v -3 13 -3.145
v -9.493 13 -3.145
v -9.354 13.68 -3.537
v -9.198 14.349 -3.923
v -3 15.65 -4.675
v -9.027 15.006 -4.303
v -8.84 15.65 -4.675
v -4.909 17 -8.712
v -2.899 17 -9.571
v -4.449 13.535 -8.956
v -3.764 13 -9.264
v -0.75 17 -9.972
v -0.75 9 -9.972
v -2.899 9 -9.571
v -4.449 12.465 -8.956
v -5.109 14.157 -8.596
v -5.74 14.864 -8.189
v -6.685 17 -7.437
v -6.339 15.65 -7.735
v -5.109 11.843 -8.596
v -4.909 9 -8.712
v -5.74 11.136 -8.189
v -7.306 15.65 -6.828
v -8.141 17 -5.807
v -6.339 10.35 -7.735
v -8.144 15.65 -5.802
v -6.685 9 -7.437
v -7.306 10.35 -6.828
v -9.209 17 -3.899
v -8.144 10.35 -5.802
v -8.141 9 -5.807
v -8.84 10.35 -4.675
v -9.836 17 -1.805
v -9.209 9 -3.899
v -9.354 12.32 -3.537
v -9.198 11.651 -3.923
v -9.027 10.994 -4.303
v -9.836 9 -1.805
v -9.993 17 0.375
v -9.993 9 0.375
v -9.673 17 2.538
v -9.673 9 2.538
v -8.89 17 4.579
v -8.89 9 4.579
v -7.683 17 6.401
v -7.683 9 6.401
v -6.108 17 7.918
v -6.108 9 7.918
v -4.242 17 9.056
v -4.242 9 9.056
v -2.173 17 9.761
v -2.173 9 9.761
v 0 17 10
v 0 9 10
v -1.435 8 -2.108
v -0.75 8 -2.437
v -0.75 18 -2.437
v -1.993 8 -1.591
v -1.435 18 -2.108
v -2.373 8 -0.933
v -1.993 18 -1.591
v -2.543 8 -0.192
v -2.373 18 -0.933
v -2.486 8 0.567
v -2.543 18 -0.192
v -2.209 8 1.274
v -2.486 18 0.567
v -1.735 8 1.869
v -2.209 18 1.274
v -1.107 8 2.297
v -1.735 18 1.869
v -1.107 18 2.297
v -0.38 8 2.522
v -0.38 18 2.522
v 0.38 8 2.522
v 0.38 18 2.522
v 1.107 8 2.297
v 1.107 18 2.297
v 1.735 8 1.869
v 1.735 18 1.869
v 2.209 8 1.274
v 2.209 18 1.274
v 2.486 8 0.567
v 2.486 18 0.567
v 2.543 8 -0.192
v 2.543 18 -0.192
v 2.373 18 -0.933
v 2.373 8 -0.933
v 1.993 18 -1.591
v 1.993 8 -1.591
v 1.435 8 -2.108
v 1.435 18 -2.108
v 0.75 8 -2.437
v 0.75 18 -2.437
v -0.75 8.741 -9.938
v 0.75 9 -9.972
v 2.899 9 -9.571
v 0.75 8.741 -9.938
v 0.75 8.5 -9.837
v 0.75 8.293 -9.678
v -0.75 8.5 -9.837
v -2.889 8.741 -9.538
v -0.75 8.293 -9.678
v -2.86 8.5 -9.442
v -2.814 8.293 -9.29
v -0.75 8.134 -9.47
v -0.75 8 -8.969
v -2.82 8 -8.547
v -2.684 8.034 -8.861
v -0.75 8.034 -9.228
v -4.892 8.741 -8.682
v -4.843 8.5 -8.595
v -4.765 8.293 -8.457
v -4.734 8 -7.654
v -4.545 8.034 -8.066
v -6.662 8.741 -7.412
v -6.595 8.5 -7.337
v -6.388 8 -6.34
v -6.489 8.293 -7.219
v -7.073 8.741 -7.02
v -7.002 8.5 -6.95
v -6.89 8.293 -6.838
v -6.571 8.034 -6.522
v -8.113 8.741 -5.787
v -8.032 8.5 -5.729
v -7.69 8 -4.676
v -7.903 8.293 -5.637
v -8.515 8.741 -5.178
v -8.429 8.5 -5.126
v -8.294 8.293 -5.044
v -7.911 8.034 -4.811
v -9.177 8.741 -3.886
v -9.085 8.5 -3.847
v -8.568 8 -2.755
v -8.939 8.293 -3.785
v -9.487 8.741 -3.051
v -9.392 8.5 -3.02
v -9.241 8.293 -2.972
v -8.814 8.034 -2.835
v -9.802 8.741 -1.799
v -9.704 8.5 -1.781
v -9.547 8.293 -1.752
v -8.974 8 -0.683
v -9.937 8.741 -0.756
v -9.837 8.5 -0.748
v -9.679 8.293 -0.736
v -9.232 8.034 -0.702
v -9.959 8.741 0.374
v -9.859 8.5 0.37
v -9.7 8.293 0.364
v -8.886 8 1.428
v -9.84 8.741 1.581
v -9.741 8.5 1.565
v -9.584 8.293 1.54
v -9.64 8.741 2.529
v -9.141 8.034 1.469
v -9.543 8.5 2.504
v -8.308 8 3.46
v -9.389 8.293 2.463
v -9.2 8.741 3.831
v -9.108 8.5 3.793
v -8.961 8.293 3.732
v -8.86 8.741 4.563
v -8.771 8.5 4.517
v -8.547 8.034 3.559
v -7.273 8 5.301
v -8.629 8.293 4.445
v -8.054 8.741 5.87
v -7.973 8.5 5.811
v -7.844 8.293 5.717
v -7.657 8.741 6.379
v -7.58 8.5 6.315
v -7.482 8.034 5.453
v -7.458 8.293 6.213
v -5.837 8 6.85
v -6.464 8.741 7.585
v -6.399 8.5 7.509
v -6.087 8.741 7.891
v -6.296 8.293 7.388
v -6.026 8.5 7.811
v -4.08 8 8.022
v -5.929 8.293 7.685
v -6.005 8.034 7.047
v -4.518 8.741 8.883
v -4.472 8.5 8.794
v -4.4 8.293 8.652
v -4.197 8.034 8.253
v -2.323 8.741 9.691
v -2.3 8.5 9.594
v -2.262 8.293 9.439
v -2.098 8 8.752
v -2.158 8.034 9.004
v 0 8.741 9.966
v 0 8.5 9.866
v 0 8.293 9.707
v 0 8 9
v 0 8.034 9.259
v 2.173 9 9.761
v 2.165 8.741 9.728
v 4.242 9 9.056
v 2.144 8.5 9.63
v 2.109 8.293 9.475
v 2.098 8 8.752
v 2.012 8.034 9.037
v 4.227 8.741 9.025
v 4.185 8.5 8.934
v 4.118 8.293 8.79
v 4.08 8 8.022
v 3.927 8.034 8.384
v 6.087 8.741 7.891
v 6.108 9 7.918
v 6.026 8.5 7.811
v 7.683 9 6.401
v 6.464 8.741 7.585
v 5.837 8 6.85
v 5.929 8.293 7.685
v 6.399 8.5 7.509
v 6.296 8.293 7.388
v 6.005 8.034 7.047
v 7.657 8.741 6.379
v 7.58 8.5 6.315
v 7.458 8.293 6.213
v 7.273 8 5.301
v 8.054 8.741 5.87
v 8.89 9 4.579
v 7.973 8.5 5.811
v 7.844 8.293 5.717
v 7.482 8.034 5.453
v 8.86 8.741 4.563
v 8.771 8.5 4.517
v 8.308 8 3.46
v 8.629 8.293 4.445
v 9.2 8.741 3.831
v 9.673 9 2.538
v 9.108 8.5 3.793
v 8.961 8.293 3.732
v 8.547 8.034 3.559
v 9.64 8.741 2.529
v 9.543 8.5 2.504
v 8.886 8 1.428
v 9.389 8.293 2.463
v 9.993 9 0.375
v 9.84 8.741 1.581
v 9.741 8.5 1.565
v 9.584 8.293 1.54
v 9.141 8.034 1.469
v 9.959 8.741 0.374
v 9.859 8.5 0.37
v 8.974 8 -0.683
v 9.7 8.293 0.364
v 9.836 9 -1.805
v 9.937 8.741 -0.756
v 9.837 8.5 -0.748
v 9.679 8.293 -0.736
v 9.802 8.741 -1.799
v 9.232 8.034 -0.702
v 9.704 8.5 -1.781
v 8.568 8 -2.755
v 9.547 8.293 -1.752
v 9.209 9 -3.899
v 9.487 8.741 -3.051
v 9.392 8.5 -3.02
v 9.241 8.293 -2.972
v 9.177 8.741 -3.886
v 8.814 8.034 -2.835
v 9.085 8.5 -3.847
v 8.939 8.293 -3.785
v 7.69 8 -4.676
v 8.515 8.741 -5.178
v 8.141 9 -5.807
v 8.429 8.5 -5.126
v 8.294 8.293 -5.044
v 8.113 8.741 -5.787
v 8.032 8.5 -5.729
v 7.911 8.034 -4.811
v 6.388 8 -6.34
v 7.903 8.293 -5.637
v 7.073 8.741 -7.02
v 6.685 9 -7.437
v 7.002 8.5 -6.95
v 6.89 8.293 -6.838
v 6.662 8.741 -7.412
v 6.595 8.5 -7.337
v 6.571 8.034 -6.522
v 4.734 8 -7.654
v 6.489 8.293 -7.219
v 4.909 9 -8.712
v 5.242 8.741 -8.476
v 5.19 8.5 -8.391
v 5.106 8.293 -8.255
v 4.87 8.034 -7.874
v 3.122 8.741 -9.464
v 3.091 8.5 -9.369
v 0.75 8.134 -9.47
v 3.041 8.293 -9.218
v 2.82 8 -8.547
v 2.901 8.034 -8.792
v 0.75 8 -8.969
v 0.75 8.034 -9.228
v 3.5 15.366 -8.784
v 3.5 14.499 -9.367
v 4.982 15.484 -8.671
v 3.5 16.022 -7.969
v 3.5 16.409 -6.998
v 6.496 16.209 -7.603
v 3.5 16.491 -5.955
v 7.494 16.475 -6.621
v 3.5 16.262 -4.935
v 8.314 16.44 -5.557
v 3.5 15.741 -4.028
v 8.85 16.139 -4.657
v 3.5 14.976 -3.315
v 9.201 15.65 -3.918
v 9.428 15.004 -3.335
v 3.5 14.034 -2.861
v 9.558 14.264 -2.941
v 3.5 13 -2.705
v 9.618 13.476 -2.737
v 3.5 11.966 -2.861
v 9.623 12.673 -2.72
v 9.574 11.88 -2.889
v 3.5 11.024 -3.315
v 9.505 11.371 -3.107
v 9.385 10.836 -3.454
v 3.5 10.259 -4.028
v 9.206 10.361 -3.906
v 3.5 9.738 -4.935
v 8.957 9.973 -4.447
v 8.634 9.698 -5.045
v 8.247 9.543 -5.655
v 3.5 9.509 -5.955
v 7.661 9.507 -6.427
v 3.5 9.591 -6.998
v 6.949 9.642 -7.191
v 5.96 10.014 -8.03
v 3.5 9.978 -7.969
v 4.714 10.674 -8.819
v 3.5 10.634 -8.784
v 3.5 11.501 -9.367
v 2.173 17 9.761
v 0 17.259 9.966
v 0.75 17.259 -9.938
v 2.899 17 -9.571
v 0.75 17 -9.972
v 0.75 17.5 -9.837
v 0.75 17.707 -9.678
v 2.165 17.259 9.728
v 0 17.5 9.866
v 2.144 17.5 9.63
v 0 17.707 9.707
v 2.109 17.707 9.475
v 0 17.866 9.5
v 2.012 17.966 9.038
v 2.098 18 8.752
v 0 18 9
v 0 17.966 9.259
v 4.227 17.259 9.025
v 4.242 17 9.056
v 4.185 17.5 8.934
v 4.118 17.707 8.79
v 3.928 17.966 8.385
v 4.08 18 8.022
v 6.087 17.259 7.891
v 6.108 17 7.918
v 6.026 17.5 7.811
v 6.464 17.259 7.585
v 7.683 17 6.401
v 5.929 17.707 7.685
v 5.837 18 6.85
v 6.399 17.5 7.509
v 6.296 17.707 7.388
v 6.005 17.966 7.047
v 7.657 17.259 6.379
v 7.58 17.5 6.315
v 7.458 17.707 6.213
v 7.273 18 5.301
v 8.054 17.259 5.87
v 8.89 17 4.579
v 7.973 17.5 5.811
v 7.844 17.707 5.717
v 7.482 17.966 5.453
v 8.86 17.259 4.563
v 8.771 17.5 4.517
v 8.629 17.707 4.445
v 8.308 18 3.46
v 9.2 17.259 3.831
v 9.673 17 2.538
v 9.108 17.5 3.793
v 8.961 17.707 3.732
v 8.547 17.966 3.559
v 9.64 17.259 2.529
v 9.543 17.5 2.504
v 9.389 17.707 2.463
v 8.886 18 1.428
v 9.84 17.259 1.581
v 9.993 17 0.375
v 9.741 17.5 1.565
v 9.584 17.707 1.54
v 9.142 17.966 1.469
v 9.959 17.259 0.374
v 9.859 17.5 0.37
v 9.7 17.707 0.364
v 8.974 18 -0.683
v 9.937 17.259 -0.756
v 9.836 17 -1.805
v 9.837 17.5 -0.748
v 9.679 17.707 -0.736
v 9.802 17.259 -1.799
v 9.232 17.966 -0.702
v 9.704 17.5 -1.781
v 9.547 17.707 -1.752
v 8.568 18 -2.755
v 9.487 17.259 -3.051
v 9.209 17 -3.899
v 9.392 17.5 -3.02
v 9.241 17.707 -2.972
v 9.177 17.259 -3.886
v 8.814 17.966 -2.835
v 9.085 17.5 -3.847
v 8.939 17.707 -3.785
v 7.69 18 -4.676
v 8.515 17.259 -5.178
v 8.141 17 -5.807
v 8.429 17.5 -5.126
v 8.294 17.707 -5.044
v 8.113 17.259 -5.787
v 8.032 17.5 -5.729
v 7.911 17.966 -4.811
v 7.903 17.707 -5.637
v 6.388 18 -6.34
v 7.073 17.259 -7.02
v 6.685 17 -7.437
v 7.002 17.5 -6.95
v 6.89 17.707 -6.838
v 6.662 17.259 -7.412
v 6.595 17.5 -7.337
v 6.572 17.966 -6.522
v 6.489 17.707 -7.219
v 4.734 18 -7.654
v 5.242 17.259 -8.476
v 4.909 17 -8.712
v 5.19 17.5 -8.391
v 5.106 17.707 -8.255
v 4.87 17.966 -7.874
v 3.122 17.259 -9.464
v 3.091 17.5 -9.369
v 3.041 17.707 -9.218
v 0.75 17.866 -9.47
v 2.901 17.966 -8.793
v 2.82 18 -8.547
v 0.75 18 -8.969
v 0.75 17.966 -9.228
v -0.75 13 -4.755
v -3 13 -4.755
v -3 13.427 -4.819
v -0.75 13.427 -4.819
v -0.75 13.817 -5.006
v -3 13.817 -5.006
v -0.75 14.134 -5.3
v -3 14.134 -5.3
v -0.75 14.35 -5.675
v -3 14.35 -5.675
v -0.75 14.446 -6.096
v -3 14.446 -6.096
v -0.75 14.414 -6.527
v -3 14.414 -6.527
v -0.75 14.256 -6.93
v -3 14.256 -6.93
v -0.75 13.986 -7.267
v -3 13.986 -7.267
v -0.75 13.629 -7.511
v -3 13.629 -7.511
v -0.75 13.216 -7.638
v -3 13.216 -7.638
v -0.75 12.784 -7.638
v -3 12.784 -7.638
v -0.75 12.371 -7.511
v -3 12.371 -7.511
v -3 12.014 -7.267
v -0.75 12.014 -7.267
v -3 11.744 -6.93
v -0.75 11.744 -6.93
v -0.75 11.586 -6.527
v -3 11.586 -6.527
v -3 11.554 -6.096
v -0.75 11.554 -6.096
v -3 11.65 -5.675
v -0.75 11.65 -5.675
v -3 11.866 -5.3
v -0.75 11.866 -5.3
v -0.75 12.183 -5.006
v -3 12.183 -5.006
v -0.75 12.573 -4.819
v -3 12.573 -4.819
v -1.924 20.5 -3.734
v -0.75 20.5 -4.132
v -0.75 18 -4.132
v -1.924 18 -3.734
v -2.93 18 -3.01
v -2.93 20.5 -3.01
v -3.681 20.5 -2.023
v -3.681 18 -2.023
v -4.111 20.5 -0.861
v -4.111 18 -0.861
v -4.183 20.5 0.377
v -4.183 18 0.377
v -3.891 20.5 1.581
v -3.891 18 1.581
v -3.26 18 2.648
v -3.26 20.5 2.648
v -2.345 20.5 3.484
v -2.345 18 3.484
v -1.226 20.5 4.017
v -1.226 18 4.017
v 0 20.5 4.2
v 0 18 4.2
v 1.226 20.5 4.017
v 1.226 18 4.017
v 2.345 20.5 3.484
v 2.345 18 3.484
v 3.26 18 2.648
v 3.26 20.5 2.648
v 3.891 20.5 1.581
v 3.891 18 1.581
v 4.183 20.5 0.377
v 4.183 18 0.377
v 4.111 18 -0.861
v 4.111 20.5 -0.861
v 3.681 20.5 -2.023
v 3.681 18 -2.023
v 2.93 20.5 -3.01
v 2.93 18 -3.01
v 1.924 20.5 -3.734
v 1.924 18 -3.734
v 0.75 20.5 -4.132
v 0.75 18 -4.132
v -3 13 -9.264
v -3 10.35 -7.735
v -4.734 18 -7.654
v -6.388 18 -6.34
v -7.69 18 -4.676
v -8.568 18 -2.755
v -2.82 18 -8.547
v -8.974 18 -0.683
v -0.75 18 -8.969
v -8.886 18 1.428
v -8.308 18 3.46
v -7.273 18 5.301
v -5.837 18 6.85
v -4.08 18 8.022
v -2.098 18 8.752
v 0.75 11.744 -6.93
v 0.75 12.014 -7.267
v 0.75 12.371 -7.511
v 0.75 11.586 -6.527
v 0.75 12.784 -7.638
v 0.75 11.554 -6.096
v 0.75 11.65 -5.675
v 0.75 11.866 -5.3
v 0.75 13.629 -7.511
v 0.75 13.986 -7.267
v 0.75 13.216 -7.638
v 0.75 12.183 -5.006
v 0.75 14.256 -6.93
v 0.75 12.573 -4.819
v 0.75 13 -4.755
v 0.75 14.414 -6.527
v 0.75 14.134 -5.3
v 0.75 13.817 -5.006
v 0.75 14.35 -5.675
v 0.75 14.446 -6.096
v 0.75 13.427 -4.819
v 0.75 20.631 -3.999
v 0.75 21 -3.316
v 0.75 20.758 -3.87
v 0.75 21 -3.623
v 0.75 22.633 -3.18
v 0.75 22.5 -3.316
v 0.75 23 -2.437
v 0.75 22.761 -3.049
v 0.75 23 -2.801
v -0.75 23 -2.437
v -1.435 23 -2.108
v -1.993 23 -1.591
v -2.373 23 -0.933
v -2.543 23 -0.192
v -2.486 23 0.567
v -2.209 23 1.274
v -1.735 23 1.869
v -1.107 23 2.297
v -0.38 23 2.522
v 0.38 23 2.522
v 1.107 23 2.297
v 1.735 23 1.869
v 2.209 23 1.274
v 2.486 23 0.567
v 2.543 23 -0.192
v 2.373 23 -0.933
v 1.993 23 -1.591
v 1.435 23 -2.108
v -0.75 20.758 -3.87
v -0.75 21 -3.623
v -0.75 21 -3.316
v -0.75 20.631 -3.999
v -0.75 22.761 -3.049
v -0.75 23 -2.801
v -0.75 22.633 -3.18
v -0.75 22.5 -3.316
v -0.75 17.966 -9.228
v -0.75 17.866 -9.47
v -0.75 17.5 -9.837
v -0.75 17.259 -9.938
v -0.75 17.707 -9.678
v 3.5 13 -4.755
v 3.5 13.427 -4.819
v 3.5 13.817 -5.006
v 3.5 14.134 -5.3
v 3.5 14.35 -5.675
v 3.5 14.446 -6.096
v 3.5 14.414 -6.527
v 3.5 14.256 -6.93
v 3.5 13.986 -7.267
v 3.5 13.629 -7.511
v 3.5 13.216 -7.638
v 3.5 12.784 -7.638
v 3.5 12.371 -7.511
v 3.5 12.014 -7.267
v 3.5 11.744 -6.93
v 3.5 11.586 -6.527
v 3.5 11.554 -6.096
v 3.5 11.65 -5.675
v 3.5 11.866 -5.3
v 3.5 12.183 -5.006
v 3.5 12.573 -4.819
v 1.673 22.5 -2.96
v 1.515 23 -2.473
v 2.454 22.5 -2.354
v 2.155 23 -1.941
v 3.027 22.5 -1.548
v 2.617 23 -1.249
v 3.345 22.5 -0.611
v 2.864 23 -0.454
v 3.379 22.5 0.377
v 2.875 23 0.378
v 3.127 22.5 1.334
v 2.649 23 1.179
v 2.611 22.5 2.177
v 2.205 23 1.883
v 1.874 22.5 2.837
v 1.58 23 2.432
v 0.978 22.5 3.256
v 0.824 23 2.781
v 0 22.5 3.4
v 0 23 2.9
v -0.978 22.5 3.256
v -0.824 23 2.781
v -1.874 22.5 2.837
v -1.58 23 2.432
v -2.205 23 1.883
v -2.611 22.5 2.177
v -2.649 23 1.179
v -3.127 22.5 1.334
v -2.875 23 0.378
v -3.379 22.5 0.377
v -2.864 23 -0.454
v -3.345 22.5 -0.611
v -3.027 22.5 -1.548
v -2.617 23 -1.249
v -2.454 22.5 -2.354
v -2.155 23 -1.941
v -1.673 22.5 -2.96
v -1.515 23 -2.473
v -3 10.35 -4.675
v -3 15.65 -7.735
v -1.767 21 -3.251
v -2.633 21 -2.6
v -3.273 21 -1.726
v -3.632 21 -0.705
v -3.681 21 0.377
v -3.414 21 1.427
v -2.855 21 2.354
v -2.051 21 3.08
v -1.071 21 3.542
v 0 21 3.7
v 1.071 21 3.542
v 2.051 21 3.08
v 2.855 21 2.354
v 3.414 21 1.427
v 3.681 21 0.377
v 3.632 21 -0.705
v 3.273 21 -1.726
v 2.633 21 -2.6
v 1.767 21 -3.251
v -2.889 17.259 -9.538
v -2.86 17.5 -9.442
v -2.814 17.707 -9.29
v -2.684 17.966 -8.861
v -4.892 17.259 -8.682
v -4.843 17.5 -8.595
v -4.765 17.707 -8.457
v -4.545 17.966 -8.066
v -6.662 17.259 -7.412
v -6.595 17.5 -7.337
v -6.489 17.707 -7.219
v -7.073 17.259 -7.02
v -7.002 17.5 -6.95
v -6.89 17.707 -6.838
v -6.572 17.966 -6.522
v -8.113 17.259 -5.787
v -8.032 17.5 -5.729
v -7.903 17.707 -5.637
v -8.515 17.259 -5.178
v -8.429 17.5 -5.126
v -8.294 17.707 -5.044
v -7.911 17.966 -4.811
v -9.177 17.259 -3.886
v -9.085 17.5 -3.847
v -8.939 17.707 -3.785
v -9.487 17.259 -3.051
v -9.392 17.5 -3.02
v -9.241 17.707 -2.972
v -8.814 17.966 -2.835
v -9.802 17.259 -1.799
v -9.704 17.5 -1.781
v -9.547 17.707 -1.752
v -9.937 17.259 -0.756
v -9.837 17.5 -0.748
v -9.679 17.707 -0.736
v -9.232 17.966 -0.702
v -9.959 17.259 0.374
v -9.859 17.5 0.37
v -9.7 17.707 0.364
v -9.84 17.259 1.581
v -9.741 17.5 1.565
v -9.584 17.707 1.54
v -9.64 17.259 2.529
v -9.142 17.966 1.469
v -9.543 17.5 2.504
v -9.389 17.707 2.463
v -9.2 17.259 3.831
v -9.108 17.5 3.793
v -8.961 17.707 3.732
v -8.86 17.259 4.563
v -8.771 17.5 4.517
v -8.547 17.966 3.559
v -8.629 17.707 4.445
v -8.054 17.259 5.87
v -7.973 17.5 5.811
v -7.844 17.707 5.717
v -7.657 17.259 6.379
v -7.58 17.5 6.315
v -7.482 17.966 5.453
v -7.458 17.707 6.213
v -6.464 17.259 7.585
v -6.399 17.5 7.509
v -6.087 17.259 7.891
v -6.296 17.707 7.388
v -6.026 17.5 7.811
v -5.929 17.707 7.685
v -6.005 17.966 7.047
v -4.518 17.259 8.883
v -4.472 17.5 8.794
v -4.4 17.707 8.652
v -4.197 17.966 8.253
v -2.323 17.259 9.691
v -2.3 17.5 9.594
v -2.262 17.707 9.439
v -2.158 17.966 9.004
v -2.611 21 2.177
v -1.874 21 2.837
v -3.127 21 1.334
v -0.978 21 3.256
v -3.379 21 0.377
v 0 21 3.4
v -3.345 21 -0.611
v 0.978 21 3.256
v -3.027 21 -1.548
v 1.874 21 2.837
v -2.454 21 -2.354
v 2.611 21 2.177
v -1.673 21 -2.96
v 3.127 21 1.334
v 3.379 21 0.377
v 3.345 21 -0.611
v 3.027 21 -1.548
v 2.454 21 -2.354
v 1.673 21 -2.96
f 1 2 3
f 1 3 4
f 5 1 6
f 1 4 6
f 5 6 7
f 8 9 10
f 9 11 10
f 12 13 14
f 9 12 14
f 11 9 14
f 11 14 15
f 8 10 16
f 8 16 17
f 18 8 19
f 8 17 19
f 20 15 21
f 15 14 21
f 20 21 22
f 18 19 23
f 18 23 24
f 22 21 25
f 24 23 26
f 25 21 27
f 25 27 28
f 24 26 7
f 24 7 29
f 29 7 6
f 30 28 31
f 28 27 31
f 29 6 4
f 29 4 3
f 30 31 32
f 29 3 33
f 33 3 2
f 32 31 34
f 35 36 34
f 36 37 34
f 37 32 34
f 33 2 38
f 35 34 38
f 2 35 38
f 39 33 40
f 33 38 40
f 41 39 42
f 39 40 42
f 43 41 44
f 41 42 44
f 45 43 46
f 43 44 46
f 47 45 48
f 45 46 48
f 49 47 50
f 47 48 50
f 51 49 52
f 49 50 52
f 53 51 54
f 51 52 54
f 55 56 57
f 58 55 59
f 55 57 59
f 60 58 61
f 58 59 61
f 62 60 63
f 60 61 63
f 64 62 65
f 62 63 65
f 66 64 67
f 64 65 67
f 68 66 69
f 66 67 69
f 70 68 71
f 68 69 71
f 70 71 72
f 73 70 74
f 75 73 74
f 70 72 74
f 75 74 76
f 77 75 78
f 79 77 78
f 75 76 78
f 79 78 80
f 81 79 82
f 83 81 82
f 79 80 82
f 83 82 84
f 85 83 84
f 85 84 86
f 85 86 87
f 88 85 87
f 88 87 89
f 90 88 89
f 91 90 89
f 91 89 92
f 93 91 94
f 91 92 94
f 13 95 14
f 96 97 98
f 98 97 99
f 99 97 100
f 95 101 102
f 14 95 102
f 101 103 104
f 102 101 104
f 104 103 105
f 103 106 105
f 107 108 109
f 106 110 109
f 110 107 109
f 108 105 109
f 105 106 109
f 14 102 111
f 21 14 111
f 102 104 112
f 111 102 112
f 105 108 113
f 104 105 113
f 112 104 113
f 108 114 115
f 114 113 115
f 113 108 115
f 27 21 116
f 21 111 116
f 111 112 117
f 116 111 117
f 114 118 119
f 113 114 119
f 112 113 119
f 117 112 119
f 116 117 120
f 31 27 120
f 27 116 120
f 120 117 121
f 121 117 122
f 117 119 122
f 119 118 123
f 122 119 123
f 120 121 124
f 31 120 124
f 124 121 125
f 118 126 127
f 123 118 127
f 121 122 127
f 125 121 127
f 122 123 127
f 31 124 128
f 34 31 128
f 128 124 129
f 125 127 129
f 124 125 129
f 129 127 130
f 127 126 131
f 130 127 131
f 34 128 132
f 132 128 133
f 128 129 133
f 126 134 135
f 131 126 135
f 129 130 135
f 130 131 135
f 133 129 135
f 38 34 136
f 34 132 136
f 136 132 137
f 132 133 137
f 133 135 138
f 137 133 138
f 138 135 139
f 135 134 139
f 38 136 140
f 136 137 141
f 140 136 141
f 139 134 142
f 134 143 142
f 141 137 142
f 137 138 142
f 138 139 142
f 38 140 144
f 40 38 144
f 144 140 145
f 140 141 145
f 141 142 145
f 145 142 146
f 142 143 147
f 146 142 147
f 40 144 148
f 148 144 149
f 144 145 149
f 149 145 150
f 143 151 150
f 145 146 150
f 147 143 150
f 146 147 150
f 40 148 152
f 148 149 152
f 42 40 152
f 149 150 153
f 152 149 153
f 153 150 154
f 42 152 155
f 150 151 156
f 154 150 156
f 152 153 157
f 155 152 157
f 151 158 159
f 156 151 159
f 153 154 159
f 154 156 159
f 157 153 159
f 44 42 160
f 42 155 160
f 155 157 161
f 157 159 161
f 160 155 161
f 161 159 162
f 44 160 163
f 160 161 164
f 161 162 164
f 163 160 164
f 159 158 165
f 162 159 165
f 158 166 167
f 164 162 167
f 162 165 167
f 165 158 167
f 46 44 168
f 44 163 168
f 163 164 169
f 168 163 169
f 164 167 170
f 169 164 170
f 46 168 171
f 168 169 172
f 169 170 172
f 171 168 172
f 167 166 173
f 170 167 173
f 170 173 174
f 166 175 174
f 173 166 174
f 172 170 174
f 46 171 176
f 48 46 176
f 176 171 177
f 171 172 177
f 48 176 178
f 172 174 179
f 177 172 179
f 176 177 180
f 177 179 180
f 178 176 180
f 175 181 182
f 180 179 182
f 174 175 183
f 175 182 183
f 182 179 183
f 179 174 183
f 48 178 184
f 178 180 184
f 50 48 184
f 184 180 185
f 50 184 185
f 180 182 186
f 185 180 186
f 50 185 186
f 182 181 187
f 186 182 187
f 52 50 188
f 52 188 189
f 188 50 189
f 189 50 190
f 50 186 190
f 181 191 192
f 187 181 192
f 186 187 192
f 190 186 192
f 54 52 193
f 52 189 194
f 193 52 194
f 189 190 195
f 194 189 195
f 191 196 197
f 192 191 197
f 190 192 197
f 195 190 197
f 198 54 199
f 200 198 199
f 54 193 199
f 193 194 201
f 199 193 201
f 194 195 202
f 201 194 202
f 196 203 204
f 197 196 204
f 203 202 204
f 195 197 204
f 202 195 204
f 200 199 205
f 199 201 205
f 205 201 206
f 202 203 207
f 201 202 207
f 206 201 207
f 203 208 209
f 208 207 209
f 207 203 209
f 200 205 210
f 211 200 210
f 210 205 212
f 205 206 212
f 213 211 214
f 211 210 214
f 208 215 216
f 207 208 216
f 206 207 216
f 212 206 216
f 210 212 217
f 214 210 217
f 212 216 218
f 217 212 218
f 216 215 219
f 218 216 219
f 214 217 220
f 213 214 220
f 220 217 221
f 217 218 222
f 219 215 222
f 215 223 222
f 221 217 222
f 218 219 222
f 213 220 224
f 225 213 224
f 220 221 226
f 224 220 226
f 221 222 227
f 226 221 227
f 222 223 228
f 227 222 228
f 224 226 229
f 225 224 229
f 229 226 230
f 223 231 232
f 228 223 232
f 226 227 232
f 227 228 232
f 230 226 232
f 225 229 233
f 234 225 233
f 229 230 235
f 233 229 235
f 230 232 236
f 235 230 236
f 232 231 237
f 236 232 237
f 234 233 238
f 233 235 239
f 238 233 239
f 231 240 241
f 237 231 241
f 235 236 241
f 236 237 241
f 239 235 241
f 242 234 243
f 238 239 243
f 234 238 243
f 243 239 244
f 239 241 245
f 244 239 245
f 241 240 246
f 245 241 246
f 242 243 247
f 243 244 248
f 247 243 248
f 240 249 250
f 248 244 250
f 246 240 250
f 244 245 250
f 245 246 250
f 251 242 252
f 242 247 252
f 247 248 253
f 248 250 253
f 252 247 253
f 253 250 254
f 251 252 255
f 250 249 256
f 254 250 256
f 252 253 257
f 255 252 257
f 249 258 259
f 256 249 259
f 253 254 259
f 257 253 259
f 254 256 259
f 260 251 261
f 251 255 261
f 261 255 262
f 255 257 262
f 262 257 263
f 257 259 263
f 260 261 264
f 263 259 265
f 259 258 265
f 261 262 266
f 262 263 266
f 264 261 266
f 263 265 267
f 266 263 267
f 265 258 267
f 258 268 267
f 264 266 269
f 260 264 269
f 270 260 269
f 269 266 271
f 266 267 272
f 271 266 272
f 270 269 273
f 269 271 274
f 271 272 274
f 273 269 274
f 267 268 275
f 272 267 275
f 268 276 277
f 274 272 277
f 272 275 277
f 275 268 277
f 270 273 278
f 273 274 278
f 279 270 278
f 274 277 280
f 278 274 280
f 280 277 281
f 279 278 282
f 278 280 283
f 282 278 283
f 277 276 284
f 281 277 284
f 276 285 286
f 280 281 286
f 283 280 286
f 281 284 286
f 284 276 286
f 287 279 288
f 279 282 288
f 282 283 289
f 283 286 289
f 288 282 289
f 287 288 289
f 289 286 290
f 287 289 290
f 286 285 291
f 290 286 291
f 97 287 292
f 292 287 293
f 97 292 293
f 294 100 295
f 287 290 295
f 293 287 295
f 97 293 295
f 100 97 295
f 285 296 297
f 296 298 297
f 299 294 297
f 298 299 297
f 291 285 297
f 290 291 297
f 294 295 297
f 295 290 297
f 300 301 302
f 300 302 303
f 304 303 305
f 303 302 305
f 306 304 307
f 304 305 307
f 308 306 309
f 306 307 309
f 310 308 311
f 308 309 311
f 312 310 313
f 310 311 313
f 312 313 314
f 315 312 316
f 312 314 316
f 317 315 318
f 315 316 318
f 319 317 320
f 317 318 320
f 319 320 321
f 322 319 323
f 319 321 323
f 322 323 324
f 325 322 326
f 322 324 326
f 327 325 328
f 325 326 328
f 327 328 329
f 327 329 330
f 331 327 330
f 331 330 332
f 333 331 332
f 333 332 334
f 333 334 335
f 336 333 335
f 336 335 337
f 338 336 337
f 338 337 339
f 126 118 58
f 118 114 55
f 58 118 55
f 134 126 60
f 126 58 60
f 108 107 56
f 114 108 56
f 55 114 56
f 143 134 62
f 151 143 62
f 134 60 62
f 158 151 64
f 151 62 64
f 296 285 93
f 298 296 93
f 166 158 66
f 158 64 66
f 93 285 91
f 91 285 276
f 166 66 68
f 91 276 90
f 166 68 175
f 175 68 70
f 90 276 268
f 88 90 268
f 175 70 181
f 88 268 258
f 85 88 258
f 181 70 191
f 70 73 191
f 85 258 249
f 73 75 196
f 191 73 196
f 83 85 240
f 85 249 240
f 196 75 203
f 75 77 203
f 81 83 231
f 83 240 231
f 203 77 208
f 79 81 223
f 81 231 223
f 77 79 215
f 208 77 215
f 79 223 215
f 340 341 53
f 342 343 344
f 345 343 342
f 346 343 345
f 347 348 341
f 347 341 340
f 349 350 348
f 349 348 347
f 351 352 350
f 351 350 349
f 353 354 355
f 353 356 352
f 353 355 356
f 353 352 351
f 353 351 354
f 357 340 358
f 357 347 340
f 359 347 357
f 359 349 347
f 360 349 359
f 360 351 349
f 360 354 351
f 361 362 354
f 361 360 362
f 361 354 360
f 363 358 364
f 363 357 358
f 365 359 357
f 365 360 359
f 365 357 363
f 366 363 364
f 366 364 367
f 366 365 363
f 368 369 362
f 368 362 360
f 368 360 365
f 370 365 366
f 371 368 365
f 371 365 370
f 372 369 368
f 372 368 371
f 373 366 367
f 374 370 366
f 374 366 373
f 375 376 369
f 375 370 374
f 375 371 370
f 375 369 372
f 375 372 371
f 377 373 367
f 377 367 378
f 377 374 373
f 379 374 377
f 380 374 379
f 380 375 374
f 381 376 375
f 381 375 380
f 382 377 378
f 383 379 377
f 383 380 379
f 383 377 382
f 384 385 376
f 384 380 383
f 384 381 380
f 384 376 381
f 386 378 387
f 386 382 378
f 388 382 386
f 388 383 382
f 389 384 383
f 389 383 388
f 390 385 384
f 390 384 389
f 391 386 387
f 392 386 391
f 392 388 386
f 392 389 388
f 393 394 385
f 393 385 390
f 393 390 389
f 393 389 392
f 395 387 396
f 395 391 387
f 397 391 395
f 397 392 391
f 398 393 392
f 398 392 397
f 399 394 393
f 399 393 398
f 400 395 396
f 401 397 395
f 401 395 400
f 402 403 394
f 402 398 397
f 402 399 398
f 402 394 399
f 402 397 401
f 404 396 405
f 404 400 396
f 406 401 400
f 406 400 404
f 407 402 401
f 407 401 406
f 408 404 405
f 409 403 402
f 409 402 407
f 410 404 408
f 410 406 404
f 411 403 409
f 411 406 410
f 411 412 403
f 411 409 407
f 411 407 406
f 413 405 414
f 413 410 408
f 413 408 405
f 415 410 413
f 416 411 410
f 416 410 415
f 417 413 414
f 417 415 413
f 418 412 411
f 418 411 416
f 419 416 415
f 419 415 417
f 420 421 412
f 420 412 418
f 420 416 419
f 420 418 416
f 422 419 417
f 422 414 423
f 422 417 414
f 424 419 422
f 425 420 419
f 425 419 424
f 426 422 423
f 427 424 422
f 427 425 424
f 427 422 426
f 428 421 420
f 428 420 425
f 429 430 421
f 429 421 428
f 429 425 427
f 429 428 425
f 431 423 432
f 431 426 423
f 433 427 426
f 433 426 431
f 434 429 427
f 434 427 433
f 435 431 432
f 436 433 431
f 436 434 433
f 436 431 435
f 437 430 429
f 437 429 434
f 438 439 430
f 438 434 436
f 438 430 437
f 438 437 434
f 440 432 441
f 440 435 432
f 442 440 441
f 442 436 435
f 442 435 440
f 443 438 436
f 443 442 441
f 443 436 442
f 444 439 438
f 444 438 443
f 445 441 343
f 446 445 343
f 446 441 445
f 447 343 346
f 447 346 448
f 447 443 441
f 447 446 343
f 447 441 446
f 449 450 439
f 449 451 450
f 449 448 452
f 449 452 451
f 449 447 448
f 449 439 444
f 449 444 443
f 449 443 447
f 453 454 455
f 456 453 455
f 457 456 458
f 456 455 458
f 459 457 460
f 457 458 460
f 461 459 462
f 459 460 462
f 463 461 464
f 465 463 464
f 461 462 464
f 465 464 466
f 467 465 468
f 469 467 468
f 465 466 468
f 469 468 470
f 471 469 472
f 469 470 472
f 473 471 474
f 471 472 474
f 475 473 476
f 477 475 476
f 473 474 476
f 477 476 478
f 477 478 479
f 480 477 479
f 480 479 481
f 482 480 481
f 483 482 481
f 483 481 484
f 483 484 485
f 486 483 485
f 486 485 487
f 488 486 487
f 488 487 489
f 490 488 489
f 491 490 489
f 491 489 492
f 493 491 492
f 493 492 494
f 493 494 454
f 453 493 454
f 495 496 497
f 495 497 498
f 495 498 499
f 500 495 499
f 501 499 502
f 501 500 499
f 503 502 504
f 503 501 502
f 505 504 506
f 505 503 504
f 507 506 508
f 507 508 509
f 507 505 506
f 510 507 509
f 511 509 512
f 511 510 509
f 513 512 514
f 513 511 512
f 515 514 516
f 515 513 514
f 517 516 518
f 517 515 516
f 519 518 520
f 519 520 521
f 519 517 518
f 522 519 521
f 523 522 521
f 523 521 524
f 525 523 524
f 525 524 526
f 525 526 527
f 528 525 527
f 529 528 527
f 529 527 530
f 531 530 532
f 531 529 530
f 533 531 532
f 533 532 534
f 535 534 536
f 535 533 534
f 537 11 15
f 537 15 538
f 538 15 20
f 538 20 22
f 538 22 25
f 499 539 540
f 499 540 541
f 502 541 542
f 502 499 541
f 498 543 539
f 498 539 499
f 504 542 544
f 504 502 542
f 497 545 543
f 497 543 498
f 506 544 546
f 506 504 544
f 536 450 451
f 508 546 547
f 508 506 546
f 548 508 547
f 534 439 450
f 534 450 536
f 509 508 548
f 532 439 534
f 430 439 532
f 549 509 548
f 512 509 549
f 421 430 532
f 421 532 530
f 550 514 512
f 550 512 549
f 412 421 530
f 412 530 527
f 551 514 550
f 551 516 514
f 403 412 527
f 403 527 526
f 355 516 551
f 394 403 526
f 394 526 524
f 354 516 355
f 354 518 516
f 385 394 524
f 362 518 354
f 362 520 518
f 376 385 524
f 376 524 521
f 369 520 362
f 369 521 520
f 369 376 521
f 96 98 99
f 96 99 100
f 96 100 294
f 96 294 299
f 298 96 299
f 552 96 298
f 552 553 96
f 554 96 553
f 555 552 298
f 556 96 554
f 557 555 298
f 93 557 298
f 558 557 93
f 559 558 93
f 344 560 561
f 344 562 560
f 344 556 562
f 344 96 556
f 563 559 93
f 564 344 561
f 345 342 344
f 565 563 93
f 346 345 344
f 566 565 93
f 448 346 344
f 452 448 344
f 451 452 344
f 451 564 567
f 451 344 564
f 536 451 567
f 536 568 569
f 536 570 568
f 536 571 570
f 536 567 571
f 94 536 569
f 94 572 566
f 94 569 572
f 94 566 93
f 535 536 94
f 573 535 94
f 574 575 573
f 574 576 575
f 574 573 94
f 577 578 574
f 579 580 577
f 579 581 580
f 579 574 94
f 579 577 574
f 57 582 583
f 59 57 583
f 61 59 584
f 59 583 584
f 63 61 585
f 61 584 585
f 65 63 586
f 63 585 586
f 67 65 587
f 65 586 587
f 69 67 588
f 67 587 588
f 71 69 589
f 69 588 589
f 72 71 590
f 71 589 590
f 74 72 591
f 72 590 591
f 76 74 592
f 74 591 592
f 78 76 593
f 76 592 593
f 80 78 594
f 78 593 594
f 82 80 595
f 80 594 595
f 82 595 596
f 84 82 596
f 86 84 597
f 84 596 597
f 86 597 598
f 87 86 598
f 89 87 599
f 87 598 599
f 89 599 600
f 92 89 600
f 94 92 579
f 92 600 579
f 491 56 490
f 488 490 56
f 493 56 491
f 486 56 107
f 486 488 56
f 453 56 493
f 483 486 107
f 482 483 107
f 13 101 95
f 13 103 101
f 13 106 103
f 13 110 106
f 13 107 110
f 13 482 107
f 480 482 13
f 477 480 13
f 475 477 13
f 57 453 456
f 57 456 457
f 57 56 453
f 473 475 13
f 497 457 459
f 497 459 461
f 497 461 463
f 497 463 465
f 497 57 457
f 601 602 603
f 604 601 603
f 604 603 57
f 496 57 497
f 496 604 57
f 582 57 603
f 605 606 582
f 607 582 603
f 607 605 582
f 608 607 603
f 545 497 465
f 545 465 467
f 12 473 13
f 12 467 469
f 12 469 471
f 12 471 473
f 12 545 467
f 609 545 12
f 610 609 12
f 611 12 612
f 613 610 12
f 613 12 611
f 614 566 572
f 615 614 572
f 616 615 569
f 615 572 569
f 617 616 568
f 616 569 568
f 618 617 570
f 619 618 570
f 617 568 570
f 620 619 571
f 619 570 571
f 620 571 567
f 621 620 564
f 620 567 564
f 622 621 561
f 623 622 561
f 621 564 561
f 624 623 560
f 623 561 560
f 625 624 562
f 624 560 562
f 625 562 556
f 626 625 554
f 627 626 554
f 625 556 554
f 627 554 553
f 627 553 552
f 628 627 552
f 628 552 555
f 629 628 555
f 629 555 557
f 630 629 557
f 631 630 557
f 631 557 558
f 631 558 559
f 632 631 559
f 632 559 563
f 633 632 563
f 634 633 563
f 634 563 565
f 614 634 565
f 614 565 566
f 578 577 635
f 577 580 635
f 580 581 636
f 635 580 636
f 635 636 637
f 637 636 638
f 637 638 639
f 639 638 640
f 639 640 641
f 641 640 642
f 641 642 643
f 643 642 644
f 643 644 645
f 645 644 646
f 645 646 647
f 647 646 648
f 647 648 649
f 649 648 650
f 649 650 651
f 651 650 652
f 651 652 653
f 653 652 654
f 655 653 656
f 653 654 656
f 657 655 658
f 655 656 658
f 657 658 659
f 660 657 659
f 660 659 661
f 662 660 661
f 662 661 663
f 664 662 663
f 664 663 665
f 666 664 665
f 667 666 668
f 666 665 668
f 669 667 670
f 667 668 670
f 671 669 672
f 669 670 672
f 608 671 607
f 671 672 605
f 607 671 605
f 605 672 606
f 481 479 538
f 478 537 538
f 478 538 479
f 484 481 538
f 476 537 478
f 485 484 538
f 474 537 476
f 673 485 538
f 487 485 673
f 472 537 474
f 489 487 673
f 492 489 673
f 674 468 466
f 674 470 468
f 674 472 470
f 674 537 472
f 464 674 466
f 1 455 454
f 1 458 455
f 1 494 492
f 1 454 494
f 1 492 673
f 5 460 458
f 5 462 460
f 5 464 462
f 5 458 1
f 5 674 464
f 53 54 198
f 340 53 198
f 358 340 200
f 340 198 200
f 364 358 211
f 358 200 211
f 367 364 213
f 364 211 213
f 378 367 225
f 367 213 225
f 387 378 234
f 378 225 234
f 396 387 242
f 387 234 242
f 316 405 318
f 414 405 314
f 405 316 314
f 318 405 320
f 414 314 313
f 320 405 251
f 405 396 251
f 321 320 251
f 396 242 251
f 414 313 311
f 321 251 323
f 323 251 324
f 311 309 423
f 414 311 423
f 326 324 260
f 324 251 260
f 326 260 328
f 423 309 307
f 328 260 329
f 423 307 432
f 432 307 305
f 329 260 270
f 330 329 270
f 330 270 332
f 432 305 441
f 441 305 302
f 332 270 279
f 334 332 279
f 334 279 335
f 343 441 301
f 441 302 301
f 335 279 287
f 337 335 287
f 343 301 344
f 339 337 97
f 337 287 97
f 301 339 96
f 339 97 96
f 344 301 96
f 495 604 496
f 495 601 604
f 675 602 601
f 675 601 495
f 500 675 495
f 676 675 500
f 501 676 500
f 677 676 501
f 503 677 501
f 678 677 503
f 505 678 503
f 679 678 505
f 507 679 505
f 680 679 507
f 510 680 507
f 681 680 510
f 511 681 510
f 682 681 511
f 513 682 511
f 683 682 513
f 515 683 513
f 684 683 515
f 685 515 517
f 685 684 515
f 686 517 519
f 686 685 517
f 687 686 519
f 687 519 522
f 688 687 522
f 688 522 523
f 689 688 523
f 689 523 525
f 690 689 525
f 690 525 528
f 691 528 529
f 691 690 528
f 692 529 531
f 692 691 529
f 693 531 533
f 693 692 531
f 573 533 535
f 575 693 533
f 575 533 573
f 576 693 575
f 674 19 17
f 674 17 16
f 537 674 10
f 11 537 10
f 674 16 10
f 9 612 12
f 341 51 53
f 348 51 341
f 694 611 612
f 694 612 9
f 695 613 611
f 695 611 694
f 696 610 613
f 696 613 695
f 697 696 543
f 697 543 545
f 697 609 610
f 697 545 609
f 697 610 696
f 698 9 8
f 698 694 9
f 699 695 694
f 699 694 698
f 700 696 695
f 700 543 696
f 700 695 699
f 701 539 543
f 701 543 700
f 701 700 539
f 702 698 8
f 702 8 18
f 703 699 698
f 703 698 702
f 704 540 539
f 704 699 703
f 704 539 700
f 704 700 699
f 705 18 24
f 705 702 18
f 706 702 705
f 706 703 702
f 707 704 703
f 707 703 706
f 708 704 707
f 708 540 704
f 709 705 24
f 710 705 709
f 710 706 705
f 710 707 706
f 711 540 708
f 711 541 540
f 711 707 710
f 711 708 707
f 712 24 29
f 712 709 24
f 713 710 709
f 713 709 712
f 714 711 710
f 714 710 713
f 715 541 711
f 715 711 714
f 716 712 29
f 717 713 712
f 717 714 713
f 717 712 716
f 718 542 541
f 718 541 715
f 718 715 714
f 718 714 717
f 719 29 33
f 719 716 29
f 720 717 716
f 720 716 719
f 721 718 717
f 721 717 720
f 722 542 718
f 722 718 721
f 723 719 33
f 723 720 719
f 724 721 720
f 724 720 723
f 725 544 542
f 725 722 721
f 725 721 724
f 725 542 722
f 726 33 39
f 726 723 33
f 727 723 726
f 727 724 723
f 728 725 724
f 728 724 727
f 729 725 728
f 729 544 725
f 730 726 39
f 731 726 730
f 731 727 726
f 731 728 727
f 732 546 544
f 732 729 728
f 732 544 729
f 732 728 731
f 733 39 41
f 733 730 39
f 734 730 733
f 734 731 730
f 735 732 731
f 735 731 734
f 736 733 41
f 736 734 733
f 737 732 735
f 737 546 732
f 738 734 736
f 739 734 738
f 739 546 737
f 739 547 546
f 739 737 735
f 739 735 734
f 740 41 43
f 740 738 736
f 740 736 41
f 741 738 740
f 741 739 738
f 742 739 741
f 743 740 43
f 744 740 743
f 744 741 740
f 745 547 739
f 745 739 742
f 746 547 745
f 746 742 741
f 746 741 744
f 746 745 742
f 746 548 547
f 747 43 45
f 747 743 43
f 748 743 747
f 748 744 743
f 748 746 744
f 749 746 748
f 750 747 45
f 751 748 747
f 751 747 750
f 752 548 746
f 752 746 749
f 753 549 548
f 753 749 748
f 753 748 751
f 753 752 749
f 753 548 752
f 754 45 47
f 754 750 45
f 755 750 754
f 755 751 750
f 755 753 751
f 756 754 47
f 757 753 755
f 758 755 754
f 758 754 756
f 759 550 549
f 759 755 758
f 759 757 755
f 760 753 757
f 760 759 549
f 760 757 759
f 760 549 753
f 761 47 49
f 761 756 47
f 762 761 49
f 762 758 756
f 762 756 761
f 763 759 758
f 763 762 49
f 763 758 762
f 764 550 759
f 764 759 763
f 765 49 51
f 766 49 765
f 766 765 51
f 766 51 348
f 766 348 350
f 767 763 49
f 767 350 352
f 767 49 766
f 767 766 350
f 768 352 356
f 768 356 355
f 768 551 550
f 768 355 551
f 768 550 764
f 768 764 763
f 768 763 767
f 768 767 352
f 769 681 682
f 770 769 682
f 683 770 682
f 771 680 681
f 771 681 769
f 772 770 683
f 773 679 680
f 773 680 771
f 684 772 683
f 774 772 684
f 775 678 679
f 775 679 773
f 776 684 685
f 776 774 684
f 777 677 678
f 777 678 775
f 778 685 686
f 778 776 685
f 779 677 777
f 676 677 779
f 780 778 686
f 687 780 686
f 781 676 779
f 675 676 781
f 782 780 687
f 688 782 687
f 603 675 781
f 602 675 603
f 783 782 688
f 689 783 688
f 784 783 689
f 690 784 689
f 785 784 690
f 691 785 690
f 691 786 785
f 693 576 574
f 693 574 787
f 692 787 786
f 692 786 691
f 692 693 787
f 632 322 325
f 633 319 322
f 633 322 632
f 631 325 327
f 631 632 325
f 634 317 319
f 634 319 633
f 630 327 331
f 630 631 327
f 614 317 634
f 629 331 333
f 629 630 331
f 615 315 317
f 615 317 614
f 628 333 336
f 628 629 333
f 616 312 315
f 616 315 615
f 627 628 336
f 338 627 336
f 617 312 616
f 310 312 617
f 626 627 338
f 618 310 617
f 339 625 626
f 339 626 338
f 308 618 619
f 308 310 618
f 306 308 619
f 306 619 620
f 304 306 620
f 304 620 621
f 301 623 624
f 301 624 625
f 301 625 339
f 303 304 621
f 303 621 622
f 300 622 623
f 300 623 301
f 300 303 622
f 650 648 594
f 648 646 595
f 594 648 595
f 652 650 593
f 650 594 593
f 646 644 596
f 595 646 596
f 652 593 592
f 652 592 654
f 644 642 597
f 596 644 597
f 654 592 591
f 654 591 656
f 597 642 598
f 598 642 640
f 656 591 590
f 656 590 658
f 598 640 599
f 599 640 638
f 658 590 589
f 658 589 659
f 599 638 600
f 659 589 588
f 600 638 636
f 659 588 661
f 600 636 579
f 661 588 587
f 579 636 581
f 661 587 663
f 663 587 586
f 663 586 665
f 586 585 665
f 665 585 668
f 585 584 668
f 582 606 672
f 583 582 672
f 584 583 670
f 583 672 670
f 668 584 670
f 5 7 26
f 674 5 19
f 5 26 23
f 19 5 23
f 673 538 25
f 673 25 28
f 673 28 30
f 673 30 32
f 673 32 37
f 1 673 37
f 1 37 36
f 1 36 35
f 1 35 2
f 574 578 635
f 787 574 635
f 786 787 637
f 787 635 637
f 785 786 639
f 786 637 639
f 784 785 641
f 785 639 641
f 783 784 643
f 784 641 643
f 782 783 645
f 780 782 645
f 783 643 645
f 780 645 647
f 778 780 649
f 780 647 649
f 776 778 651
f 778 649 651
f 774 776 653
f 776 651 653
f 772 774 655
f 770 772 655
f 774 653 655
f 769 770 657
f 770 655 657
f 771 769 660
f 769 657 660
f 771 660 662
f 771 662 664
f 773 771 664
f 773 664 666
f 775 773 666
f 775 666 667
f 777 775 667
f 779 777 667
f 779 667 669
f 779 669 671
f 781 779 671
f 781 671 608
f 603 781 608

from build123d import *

# Parameters (mm, degrees)
SKETCH1_R              = 4.05
BOSS_EXTRUDE1_DEPTH    = 8
SKETCH2_R              = 10
BOSS_EXTRUDE2_DEPTH    = 10
FILLET1_R              = 1
SKETCH3_R              = 2.55
CUT_EXTRUDE1_DEPTH     = 10
CUT_EXTRUDE2_REACH     = 24.891
M2_5_CLEARANCE_HOLE1_D = 2.9
SKETCH28_R             = 3.5
CUT_EXTRUDE3_DEPTH     = 6.5
SKETCH29_W             = 8.1
SKETCH29_H             = 0.5
CUT_EXTRUDE7_DEPTH     = 23.891046451
FILLET2_R              = 0.25
BOSS_EXTRUDE3_START    = 5
BOSS_EXTRUDE3_DEPTH    = 5
CHAMFER1_SIZE          = 0.5
CUT_EXTRUDE8_DEPTH     = 7
BOSS_EXTRUDE4_START    = -2
BOSS_EXTRUDE4_DEPTH    = 3
CHAMFER2_SIZE          = 0.5
SKETCH35_R             = 4.05
CUT_EXTRUDE9_DEPTH     = 8


with BuildPart() as part:
    # Sketch1 → Boss-Extrude1 (new body)
    with BuildSketch(Plane(origin=(0, 0, 0), x_dir=(1, 0, 0), z_dir=(0, 1, 0))):
        with Locations(Location((0, 0, 0), (0, 0, 270))):
            Circle(SKETCH1_R)
    extrude(amount=BOSS_EXTRUDE1_DEPTH)

    # Sketch2 → Boss-Extrude2 (add)
    with BuildSketch(Plane(origin=(0, 8, 0), x_dir=(1, 0, 0), z_dir=(0, 1, 0))):
        with Locations(Location((0, 0, 0), (0, 0, 270))):
            Circle(SKETCH2_R)
    extrude(amount=BOSS_EXTRUDE2_DEPTH)

    # Fillet1
    fillet1_edges = [part.edges().sort_by_distance(p)[0] for p in [
        (0, 0, -4.05),
        (0, 8, -10),
        (0, 18, -10),
    ]]
    fillet(fillet1_edges, radius=FILLET1_R)

    # Sketch3 → Cut-Extrude1 (cut)
    with BuildSketch(Plane(origin=(0, 18, 0), x_dir=(1, 0, 0), z_dir=(0, 1, 0))):
        with Locations(Location((0, 0, 0), (0, 0, 270))):
            Circle(SKETCH3_R)
    extrude(amount=-CUT_EXTRUDE1_DEPTH, mode=Mode.SUBTRACT)

    # Cut-Extrude2: up to this face of the body (flat: up to its plane)
    cut_extrude2_end = Plane(part.part.faces().sort_by_distance((0, 8, -8.745441559))[0])
    # Sketch20 → Cut-Extrude2 (cut, up to the picked face)
    with BuildSketch(Plane(origin=(0, 18, 0), x_dir=(1, 0, 0), z_dir=(0, 1, 0)), mode=Mode.PRIVATE) as cut_extrude2_sk1:
        with BuildLine():
            Line((-0.75, 2.437211521), (0.75, 2.437211521))
            Line((0.75, 2.437211521), (0.75, 9.971835338))
            ThreePointArc((0.75, 9.971835338), (0, 10), (-0.75, 9.971835338))
            Line((-0.75, 9.971835338), (-0.75, 2.437211521))
        make_face()
    cut_extrude2_tool1 = split(extrude(cut_extrude2_sk1.sketch, amount=-CUT_EXTRUDE2_REACH, mode=Mode.PRIVATE), bisect_by=cut_extrude2_end, keep=Keep.BOTH, mode=Mode.PRIVATE)
    add(cut_extrude2_tool1.solids().sort_by(Axis((0, 18, -6.213919), (0, -1, 0)))[0], mode=Mode.SUBTRACT)

    # M2.5 Clearance Hole1 (through all)
    with Locations(Plane(origin=(10, 0, 0), x_dir=(0, 0, -1), z_dir=(1, 0, 0))):
        with Locations((6.204523429, 13)):
            Hole(M2_5_CLEARANCE_HOLE1_D / 2)

    # Sketch28 → Cut-Extrude3 (cut)
    with BuildSketch(Plane(origin=(10, 0, 0), x_dir=(0, 0, -1), z_dir=(1, 0, 0))):
        with Locations((6.204523429, 13)):
            Circle(SKETCH28_R)
    extrude(amount=-CUT_EXTRUDE3_DEPTH, mode=Mode.SUBTRACT)

    # Sketch29 → Cut-Extrude7 (cut, through all)
    with BuildSketch(Plane.XY):
        with Locations((0, 7.75)):
            Rectangle(SKETCH29_W, SKETCH29_H)
    extrude(amount=-CUT_EXTRUDE7_DEPTH, mode=Mode.SUBTRACT)

    # Fillet2
    fillet2_edges = [part.edges().sort_by_distance(p)[0] for p in [
        (-3.3, 8, 0),
        (3.3, 8, 0),
        (0, 7.5, 0),
    ]]
    fillet(fillet2_edges, radius=FILLET2_R - 0.0001)  # a hair under: the kernel refuses the full size

    # Sketch30 → Boss-Extrude3 (add)
    with BuildSketch(Plane(origin=(0, 18, 0), x_dir=(1, 0, 0), z_dir=(0, 1, 0)).offset(BOSS_EXTRUDE3_START)):
        with BuildLine():
            Line((-0.75, 3.31624788), (-0.75, 2.437211521))
            ThreePointArc((-0.75, 2.437211521), (0, -2.55), (0.75, 2.437211521))
            Line((0.75, 2.437211521), (0.75, 3.31624788))
            ThreePointArc((0.75, 3.31624788), (0, -3.4), (-0.75, 3.31624788))
        make_face()
    extrude(amount=-BOSS_EXTRUDE3_DEPTH)

    # Chamfer1
    chamfer1_edges = [part.edges().sort_by_distance(p)[0] for p in [
        (0, 23, 3.4),
    ]]
    chamfer(chamfer1_edges, length=CHAMFER1_SIZE)

    # Sketch33 → Cut-Extrude8 (cut)
    with BuildSketch(Plane.ZY.offset(10)):
        Polygon((-3.144567003, 13), (-4.674545216, 15.65), (-7.734501643, 15.65), (-9.264479856, 13), (-7.734501643, 10.35), (-4.674545216, 10.35), align=None)
    extrude(amount=-CUT_EXTRUDE8_DEPTH, mode=Mode.SUBTRACT)

    # Sketch34 → Boss-Extrude4 (add)
    with BuildSketch(Plane(origin=(0, 23, 0), x_dir=(1, 0, 0), z_dir=(0, 1, 0)).offset(BOSS_EXTRUDE4_START)):
        with BuildLine():
            Line((-0.75, 3.31624788), (-0.75, 4.132493194))
            ThreePointArc((-0.75, 4.132493194), (0, -4.2), (0.75, 4.132493194))
            Line((0.75, 4.132493194), (0.75, 3.31624788))
            ThreePointArc((0.75, 3.31624788), (0, -3.4), (-0.75, 3.31624788))
        make_face()
    extrude(amount=-BOSS_EXTRUDE4_DEPTH)

    # Chamfer2
    chamfer2_edges = [part.edges().sort_by_distance(p)[0] for p in [
        (0, 21, 4.2),
    ]]
    chamfer(chamfer2_edges, length=CHAMFER2_SIZE)

    # Sketch35 → Cut-Extrude9 (cut)
    with BuildSketch(Plane.XZ):
        Circle(SKETCH35_R)
    extrude(amount=-CUT_EXTRUDE9_DEPTH, mode=Mode.SUBTRACT)


solid = part.part
